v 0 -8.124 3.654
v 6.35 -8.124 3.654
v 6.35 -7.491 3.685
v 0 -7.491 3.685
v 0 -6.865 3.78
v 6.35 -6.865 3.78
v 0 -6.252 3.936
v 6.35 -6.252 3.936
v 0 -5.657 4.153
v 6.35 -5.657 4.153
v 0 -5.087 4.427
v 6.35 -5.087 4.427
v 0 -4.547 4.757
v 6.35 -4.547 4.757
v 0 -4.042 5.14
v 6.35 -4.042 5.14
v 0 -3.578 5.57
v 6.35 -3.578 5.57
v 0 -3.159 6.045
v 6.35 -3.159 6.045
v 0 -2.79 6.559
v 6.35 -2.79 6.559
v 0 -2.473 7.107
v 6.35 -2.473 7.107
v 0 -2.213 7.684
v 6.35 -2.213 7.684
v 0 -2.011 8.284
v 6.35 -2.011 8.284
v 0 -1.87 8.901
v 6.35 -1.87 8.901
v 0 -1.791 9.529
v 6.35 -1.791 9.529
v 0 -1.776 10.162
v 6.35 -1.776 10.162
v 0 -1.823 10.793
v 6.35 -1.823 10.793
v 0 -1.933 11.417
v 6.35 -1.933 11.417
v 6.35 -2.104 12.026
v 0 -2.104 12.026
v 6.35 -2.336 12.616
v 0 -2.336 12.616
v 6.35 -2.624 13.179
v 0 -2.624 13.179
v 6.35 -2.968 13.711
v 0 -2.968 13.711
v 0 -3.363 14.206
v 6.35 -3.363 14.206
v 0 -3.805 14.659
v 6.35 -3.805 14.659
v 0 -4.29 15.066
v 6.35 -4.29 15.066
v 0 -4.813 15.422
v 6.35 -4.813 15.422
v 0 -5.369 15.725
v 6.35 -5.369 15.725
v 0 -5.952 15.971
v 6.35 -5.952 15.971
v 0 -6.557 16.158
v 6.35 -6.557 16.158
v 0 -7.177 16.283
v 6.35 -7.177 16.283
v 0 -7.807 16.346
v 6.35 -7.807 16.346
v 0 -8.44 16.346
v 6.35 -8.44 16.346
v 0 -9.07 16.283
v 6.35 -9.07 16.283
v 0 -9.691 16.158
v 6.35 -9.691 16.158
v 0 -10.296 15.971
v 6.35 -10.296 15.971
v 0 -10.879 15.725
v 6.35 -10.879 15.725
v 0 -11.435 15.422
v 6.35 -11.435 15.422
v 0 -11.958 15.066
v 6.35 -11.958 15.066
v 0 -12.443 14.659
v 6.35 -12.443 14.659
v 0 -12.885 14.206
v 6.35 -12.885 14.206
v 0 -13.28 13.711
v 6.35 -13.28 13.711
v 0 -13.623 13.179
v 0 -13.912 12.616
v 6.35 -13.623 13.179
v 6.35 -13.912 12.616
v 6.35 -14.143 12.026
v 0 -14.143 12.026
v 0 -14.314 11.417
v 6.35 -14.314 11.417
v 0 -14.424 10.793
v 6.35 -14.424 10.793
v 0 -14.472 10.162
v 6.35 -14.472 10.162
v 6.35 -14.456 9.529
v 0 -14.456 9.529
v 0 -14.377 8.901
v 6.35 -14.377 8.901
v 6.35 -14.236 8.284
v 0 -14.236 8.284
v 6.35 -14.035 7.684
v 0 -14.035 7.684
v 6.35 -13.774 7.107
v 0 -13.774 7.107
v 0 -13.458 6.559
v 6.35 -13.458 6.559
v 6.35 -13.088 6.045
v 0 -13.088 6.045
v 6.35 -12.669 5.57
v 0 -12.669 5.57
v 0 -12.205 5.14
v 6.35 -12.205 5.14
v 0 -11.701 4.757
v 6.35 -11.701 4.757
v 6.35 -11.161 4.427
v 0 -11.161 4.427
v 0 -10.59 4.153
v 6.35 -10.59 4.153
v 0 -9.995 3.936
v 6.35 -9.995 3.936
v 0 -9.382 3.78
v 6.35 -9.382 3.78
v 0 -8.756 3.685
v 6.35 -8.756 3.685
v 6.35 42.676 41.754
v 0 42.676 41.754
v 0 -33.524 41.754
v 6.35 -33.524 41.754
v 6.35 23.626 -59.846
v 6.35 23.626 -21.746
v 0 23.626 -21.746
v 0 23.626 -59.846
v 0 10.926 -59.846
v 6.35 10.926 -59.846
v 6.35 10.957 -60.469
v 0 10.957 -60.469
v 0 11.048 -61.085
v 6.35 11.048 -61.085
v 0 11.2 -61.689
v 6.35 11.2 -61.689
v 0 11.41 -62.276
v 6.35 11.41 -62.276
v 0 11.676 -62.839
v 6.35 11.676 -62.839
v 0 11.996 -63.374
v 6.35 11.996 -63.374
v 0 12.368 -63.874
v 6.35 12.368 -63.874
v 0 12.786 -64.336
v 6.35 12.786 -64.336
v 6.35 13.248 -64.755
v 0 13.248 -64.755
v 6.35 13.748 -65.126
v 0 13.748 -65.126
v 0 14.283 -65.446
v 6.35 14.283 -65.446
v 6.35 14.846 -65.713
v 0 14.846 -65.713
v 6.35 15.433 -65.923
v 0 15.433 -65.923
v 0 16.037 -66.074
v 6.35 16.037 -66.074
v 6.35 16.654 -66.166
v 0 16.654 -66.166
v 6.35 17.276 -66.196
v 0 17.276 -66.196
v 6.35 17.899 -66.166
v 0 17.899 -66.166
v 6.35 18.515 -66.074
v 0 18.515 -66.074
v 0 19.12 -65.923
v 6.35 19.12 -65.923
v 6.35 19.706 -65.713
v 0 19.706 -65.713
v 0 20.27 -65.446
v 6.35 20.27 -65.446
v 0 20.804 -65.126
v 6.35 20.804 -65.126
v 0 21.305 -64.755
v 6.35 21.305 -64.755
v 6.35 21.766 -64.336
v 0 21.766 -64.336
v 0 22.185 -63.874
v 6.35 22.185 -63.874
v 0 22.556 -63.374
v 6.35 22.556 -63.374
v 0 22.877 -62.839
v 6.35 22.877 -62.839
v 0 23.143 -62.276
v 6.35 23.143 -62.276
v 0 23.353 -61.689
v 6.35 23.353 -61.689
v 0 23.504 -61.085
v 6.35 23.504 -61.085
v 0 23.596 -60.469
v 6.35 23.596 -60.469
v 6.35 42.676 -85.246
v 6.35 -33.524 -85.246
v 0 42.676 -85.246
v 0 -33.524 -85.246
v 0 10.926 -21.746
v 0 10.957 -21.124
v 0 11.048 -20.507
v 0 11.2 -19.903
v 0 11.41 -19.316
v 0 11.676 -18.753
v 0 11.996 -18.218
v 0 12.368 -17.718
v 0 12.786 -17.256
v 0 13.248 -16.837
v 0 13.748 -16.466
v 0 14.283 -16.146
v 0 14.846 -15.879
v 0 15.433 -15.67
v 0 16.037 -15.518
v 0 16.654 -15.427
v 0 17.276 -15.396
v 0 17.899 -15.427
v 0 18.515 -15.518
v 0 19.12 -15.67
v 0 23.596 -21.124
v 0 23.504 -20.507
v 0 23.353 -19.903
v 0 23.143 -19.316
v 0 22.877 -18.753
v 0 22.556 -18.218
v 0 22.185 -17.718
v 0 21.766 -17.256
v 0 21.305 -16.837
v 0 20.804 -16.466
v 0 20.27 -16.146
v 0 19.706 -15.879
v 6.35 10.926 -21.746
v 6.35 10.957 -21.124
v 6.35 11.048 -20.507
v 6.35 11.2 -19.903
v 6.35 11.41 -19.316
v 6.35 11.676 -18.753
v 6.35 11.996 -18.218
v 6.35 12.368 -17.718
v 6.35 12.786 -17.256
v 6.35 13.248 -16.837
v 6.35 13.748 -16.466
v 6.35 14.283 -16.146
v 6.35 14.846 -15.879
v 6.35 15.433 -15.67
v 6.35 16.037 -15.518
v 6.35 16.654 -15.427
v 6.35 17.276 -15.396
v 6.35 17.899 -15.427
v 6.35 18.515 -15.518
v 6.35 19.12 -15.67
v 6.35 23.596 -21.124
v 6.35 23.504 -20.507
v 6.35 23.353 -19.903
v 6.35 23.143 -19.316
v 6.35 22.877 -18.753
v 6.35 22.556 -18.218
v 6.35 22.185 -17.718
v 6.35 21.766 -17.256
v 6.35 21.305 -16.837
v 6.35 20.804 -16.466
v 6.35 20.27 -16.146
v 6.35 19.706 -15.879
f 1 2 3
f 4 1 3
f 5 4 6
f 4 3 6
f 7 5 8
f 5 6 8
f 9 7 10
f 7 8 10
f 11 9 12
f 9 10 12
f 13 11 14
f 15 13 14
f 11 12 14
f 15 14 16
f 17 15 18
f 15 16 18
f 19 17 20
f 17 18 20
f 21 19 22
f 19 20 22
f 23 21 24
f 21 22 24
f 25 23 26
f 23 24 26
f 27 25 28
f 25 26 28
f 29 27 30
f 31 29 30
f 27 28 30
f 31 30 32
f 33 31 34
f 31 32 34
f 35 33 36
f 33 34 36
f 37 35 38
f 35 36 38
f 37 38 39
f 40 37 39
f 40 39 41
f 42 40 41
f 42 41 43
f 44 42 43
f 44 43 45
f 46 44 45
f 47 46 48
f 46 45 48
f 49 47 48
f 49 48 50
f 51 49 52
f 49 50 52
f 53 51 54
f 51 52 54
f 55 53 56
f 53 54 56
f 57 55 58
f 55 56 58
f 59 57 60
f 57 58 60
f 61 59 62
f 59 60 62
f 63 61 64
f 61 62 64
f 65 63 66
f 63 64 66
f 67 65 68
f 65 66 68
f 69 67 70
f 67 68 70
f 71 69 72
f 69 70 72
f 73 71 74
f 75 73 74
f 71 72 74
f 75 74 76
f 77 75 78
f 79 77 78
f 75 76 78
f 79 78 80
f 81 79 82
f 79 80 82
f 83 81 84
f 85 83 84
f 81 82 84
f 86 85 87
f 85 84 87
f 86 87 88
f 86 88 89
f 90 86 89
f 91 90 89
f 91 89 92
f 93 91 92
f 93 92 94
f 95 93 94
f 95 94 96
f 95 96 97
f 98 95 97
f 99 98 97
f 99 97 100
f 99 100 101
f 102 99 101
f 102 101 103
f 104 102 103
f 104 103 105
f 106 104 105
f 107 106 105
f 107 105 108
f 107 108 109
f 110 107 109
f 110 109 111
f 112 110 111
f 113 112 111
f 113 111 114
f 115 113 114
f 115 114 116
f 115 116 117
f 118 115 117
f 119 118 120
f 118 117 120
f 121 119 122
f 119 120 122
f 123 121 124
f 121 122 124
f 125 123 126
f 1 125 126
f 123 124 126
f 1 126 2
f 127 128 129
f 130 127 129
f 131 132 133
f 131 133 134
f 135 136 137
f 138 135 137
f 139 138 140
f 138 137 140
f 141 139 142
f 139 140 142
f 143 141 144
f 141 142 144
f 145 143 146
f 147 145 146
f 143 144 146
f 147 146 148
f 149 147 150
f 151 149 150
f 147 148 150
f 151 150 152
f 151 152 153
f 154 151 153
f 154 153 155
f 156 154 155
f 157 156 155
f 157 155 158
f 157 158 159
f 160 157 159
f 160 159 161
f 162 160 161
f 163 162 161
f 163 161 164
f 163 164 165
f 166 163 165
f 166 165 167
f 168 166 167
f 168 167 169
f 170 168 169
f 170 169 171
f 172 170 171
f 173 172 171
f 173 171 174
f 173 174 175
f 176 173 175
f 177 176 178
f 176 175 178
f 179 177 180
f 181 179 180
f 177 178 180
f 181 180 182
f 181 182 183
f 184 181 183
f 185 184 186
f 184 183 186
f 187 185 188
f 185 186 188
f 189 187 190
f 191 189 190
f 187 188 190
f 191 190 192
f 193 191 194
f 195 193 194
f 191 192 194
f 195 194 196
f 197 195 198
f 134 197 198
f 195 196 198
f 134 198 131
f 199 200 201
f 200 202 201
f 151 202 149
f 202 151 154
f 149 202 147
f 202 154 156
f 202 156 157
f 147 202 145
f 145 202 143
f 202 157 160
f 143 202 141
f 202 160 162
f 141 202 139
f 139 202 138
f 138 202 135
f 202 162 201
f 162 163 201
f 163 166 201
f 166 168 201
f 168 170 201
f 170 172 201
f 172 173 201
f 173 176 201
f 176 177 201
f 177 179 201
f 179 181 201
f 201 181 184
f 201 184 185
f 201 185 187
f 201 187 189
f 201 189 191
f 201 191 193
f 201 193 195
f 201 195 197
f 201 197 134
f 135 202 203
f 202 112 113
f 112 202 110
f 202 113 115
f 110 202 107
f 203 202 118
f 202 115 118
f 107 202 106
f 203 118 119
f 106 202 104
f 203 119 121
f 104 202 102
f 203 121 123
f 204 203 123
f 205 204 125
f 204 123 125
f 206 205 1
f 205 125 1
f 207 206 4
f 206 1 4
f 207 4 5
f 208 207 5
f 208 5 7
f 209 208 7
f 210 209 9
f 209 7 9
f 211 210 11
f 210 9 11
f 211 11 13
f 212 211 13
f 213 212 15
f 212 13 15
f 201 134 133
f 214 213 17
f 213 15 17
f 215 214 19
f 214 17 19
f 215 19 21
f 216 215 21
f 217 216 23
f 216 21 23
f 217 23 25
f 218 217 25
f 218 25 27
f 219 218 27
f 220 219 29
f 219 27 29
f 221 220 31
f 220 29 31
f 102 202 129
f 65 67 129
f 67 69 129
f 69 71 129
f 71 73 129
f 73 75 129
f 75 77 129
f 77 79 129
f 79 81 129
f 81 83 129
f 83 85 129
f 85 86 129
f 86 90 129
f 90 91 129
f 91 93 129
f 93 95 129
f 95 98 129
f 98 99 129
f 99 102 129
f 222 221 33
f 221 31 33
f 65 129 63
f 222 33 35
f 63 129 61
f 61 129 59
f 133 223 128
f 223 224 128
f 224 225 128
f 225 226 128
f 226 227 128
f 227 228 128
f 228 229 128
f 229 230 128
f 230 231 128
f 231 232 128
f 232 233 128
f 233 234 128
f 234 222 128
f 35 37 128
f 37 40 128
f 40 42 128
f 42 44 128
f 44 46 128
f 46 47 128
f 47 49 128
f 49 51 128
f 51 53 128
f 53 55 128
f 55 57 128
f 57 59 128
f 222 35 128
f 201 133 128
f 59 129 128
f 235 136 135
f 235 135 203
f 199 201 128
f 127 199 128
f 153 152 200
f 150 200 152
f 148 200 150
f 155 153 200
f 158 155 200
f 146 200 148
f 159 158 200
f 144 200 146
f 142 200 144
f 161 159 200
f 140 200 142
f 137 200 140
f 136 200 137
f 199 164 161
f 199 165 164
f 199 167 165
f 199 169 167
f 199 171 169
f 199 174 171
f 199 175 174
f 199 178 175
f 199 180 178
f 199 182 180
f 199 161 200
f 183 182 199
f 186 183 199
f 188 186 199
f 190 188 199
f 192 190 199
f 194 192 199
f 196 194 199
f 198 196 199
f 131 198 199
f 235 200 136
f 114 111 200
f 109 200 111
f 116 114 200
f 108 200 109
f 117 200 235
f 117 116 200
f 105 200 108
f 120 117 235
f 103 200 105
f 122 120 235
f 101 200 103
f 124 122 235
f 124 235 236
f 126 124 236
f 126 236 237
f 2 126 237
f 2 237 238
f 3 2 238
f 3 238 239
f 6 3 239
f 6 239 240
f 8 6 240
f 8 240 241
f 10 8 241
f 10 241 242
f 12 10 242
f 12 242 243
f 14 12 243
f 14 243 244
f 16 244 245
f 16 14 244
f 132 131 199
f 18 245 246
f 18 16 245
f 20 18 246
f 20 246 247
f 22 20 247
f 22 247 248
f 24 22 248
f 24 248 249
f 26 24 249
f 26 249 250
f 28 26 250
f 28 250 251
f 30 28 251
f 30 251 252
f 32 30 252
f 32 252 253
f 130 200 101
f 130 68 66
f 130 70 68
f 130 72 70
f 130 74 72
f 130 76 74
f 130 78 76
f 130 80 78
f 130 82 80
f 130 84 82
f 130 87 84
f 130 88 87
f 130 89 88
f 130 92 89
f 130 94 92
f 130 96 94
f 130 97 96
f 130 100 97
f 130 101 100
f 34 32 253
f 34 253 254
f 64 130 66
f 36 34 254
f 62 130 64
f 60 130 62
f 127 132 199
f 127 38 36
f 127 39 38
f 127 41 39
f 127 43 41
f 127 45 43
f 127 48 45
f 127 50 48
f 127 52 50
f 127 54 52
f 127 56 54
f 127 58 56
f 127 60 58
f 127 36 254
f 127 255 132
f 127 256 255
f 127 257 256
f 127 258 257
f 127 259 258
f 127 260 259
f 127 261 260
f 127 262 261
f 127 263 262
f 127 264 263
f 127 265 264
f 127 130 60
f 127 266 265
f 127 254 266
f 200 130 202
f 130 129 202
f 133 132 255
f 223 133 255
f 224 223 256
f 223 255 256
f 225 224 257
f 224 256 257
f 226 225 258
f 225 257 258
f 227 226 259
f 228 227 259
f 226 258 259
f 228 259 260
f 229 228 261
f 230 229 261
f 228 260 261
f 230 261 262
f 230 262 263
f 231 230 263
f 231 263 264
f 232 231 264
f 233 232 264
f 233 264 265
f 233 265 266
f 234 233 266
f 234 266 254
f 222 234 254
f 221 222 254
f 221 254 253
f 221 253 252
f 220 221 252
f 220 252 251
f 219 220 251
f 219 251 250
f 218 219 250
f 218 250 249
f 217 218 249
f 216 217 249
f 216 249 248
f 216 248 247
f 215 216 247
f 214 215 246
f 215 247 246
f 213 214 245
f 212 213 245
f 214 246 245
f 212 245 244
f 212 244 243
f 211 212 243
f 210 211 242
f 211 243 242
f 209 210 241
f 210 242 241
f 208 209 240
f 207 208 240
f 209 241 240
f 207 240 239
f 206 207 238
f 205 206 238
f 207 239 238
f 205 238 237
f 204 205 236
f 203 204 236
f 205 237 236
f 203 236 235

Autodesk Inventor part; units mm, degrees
ref_plane "YZ Plane" through (0, 0, 0) normal (1, 0, 0) x (0, 1, 0)
ref_plane "XZ Plane" through (0, 0, 0) normal (0, 1, 0) x (-1, 0, 0)
ref_plane "XY Plane" through (0, 0, 0) normal (0, 0, 1) x (1, 0, 0)
sketch "Sketch1" plane through (0, 0, 0) normal (1, 0, 0) x (0, 1, 0)
  line L0 (42.6763, 41.7539) -> (-33.5237, 41.7539)
  line L1 (-33.5237, 41.7539) -> (-33.5237, -85.2461)
  line L2 (-33.5237, -85.2461) -> (42.6763, -85.2461)
  line L3 (42.6763, -85.2461) -> (42.6763, 41.7539)
  point P0 (0, 0)
  dimension "d0" = 76.2
  dimension "d1" = 127
extrude "Extrusion1" add sketch "Sketch1" along normal blind 6.35
sketch "Sketch3" plane through (6.35, 0, 0) normal (1, 0, 0) x (0, 0, -1)
  arc A0 (59.8461, 10.9263) -> (59.8461, 23.6263) centre (59.8461, 17.2763) ccw
  arc A1 (21.7461, 23.6263) -> (21.7461, 10.9263) centre (21.7461, 17.2763) ccw
  line L0 (21.7461, 23.6263) -> (59.8461, 23.6263)
  line L1 (59.8461, 10.9263) -> (21.7461, 10.9263)
  line L2 (-41.7539, 42.6763) -> (-41.7539, -33.5237) projected
  line L3 (85.2461, 42.6763) -> (-41.7539, 42.6763) projected
  point P0 (0, 0)
  dimension "d4" = 38.1
  dimension "d5" = 101.6
  dimension "d6" = 25.4
  dimension "d7" = 25.4
  dimension "d9" = 6.35
extrude "Extrusion2" cut sketch "Sketch3" against normal blind 6.35
sketch "Sketch4" plane through (6.35, 0, 0) normal (1, 0, 0) x (0, 0, -1)
  circle A0 centre (-10.0039, -8.1237) radius 6.35
  line L0 (-41.7539, 42.6763) -> (-41.7539, -33.5237) projected
  line L1 (85.2461, 42.6763) -> (-41.7539, 42.6763) projected
  point P0 (0, 0)
  dimension "d12" = 31.75
  dimension "d13" = 50.8
  dimension "d14" = 12.7
extrude "Extrusion3" cut sketch "Sketch4" against normal blind 6.35
equation "\"d1\" = 1.66667 * d0"
equation "\"d2\" = 0.05 * d1"
equation "\"d4\" = 0.5 * d0"
equation "\"d5\" = 0.8 * d1"
equation "\"d6\" = 0.333333 * d0"
equation "\"d7\" = 0.333333 * d0"
equation "\"d9\" = d2"
equation "\"d10\" = 0.05 * d1"
equation "\"d12\" = 0.25 * d1"
equation "\"d13\" = 0.666667 * d0"
equation "\"d15\" = 0.05 * d1"
properties part number "8.2"
